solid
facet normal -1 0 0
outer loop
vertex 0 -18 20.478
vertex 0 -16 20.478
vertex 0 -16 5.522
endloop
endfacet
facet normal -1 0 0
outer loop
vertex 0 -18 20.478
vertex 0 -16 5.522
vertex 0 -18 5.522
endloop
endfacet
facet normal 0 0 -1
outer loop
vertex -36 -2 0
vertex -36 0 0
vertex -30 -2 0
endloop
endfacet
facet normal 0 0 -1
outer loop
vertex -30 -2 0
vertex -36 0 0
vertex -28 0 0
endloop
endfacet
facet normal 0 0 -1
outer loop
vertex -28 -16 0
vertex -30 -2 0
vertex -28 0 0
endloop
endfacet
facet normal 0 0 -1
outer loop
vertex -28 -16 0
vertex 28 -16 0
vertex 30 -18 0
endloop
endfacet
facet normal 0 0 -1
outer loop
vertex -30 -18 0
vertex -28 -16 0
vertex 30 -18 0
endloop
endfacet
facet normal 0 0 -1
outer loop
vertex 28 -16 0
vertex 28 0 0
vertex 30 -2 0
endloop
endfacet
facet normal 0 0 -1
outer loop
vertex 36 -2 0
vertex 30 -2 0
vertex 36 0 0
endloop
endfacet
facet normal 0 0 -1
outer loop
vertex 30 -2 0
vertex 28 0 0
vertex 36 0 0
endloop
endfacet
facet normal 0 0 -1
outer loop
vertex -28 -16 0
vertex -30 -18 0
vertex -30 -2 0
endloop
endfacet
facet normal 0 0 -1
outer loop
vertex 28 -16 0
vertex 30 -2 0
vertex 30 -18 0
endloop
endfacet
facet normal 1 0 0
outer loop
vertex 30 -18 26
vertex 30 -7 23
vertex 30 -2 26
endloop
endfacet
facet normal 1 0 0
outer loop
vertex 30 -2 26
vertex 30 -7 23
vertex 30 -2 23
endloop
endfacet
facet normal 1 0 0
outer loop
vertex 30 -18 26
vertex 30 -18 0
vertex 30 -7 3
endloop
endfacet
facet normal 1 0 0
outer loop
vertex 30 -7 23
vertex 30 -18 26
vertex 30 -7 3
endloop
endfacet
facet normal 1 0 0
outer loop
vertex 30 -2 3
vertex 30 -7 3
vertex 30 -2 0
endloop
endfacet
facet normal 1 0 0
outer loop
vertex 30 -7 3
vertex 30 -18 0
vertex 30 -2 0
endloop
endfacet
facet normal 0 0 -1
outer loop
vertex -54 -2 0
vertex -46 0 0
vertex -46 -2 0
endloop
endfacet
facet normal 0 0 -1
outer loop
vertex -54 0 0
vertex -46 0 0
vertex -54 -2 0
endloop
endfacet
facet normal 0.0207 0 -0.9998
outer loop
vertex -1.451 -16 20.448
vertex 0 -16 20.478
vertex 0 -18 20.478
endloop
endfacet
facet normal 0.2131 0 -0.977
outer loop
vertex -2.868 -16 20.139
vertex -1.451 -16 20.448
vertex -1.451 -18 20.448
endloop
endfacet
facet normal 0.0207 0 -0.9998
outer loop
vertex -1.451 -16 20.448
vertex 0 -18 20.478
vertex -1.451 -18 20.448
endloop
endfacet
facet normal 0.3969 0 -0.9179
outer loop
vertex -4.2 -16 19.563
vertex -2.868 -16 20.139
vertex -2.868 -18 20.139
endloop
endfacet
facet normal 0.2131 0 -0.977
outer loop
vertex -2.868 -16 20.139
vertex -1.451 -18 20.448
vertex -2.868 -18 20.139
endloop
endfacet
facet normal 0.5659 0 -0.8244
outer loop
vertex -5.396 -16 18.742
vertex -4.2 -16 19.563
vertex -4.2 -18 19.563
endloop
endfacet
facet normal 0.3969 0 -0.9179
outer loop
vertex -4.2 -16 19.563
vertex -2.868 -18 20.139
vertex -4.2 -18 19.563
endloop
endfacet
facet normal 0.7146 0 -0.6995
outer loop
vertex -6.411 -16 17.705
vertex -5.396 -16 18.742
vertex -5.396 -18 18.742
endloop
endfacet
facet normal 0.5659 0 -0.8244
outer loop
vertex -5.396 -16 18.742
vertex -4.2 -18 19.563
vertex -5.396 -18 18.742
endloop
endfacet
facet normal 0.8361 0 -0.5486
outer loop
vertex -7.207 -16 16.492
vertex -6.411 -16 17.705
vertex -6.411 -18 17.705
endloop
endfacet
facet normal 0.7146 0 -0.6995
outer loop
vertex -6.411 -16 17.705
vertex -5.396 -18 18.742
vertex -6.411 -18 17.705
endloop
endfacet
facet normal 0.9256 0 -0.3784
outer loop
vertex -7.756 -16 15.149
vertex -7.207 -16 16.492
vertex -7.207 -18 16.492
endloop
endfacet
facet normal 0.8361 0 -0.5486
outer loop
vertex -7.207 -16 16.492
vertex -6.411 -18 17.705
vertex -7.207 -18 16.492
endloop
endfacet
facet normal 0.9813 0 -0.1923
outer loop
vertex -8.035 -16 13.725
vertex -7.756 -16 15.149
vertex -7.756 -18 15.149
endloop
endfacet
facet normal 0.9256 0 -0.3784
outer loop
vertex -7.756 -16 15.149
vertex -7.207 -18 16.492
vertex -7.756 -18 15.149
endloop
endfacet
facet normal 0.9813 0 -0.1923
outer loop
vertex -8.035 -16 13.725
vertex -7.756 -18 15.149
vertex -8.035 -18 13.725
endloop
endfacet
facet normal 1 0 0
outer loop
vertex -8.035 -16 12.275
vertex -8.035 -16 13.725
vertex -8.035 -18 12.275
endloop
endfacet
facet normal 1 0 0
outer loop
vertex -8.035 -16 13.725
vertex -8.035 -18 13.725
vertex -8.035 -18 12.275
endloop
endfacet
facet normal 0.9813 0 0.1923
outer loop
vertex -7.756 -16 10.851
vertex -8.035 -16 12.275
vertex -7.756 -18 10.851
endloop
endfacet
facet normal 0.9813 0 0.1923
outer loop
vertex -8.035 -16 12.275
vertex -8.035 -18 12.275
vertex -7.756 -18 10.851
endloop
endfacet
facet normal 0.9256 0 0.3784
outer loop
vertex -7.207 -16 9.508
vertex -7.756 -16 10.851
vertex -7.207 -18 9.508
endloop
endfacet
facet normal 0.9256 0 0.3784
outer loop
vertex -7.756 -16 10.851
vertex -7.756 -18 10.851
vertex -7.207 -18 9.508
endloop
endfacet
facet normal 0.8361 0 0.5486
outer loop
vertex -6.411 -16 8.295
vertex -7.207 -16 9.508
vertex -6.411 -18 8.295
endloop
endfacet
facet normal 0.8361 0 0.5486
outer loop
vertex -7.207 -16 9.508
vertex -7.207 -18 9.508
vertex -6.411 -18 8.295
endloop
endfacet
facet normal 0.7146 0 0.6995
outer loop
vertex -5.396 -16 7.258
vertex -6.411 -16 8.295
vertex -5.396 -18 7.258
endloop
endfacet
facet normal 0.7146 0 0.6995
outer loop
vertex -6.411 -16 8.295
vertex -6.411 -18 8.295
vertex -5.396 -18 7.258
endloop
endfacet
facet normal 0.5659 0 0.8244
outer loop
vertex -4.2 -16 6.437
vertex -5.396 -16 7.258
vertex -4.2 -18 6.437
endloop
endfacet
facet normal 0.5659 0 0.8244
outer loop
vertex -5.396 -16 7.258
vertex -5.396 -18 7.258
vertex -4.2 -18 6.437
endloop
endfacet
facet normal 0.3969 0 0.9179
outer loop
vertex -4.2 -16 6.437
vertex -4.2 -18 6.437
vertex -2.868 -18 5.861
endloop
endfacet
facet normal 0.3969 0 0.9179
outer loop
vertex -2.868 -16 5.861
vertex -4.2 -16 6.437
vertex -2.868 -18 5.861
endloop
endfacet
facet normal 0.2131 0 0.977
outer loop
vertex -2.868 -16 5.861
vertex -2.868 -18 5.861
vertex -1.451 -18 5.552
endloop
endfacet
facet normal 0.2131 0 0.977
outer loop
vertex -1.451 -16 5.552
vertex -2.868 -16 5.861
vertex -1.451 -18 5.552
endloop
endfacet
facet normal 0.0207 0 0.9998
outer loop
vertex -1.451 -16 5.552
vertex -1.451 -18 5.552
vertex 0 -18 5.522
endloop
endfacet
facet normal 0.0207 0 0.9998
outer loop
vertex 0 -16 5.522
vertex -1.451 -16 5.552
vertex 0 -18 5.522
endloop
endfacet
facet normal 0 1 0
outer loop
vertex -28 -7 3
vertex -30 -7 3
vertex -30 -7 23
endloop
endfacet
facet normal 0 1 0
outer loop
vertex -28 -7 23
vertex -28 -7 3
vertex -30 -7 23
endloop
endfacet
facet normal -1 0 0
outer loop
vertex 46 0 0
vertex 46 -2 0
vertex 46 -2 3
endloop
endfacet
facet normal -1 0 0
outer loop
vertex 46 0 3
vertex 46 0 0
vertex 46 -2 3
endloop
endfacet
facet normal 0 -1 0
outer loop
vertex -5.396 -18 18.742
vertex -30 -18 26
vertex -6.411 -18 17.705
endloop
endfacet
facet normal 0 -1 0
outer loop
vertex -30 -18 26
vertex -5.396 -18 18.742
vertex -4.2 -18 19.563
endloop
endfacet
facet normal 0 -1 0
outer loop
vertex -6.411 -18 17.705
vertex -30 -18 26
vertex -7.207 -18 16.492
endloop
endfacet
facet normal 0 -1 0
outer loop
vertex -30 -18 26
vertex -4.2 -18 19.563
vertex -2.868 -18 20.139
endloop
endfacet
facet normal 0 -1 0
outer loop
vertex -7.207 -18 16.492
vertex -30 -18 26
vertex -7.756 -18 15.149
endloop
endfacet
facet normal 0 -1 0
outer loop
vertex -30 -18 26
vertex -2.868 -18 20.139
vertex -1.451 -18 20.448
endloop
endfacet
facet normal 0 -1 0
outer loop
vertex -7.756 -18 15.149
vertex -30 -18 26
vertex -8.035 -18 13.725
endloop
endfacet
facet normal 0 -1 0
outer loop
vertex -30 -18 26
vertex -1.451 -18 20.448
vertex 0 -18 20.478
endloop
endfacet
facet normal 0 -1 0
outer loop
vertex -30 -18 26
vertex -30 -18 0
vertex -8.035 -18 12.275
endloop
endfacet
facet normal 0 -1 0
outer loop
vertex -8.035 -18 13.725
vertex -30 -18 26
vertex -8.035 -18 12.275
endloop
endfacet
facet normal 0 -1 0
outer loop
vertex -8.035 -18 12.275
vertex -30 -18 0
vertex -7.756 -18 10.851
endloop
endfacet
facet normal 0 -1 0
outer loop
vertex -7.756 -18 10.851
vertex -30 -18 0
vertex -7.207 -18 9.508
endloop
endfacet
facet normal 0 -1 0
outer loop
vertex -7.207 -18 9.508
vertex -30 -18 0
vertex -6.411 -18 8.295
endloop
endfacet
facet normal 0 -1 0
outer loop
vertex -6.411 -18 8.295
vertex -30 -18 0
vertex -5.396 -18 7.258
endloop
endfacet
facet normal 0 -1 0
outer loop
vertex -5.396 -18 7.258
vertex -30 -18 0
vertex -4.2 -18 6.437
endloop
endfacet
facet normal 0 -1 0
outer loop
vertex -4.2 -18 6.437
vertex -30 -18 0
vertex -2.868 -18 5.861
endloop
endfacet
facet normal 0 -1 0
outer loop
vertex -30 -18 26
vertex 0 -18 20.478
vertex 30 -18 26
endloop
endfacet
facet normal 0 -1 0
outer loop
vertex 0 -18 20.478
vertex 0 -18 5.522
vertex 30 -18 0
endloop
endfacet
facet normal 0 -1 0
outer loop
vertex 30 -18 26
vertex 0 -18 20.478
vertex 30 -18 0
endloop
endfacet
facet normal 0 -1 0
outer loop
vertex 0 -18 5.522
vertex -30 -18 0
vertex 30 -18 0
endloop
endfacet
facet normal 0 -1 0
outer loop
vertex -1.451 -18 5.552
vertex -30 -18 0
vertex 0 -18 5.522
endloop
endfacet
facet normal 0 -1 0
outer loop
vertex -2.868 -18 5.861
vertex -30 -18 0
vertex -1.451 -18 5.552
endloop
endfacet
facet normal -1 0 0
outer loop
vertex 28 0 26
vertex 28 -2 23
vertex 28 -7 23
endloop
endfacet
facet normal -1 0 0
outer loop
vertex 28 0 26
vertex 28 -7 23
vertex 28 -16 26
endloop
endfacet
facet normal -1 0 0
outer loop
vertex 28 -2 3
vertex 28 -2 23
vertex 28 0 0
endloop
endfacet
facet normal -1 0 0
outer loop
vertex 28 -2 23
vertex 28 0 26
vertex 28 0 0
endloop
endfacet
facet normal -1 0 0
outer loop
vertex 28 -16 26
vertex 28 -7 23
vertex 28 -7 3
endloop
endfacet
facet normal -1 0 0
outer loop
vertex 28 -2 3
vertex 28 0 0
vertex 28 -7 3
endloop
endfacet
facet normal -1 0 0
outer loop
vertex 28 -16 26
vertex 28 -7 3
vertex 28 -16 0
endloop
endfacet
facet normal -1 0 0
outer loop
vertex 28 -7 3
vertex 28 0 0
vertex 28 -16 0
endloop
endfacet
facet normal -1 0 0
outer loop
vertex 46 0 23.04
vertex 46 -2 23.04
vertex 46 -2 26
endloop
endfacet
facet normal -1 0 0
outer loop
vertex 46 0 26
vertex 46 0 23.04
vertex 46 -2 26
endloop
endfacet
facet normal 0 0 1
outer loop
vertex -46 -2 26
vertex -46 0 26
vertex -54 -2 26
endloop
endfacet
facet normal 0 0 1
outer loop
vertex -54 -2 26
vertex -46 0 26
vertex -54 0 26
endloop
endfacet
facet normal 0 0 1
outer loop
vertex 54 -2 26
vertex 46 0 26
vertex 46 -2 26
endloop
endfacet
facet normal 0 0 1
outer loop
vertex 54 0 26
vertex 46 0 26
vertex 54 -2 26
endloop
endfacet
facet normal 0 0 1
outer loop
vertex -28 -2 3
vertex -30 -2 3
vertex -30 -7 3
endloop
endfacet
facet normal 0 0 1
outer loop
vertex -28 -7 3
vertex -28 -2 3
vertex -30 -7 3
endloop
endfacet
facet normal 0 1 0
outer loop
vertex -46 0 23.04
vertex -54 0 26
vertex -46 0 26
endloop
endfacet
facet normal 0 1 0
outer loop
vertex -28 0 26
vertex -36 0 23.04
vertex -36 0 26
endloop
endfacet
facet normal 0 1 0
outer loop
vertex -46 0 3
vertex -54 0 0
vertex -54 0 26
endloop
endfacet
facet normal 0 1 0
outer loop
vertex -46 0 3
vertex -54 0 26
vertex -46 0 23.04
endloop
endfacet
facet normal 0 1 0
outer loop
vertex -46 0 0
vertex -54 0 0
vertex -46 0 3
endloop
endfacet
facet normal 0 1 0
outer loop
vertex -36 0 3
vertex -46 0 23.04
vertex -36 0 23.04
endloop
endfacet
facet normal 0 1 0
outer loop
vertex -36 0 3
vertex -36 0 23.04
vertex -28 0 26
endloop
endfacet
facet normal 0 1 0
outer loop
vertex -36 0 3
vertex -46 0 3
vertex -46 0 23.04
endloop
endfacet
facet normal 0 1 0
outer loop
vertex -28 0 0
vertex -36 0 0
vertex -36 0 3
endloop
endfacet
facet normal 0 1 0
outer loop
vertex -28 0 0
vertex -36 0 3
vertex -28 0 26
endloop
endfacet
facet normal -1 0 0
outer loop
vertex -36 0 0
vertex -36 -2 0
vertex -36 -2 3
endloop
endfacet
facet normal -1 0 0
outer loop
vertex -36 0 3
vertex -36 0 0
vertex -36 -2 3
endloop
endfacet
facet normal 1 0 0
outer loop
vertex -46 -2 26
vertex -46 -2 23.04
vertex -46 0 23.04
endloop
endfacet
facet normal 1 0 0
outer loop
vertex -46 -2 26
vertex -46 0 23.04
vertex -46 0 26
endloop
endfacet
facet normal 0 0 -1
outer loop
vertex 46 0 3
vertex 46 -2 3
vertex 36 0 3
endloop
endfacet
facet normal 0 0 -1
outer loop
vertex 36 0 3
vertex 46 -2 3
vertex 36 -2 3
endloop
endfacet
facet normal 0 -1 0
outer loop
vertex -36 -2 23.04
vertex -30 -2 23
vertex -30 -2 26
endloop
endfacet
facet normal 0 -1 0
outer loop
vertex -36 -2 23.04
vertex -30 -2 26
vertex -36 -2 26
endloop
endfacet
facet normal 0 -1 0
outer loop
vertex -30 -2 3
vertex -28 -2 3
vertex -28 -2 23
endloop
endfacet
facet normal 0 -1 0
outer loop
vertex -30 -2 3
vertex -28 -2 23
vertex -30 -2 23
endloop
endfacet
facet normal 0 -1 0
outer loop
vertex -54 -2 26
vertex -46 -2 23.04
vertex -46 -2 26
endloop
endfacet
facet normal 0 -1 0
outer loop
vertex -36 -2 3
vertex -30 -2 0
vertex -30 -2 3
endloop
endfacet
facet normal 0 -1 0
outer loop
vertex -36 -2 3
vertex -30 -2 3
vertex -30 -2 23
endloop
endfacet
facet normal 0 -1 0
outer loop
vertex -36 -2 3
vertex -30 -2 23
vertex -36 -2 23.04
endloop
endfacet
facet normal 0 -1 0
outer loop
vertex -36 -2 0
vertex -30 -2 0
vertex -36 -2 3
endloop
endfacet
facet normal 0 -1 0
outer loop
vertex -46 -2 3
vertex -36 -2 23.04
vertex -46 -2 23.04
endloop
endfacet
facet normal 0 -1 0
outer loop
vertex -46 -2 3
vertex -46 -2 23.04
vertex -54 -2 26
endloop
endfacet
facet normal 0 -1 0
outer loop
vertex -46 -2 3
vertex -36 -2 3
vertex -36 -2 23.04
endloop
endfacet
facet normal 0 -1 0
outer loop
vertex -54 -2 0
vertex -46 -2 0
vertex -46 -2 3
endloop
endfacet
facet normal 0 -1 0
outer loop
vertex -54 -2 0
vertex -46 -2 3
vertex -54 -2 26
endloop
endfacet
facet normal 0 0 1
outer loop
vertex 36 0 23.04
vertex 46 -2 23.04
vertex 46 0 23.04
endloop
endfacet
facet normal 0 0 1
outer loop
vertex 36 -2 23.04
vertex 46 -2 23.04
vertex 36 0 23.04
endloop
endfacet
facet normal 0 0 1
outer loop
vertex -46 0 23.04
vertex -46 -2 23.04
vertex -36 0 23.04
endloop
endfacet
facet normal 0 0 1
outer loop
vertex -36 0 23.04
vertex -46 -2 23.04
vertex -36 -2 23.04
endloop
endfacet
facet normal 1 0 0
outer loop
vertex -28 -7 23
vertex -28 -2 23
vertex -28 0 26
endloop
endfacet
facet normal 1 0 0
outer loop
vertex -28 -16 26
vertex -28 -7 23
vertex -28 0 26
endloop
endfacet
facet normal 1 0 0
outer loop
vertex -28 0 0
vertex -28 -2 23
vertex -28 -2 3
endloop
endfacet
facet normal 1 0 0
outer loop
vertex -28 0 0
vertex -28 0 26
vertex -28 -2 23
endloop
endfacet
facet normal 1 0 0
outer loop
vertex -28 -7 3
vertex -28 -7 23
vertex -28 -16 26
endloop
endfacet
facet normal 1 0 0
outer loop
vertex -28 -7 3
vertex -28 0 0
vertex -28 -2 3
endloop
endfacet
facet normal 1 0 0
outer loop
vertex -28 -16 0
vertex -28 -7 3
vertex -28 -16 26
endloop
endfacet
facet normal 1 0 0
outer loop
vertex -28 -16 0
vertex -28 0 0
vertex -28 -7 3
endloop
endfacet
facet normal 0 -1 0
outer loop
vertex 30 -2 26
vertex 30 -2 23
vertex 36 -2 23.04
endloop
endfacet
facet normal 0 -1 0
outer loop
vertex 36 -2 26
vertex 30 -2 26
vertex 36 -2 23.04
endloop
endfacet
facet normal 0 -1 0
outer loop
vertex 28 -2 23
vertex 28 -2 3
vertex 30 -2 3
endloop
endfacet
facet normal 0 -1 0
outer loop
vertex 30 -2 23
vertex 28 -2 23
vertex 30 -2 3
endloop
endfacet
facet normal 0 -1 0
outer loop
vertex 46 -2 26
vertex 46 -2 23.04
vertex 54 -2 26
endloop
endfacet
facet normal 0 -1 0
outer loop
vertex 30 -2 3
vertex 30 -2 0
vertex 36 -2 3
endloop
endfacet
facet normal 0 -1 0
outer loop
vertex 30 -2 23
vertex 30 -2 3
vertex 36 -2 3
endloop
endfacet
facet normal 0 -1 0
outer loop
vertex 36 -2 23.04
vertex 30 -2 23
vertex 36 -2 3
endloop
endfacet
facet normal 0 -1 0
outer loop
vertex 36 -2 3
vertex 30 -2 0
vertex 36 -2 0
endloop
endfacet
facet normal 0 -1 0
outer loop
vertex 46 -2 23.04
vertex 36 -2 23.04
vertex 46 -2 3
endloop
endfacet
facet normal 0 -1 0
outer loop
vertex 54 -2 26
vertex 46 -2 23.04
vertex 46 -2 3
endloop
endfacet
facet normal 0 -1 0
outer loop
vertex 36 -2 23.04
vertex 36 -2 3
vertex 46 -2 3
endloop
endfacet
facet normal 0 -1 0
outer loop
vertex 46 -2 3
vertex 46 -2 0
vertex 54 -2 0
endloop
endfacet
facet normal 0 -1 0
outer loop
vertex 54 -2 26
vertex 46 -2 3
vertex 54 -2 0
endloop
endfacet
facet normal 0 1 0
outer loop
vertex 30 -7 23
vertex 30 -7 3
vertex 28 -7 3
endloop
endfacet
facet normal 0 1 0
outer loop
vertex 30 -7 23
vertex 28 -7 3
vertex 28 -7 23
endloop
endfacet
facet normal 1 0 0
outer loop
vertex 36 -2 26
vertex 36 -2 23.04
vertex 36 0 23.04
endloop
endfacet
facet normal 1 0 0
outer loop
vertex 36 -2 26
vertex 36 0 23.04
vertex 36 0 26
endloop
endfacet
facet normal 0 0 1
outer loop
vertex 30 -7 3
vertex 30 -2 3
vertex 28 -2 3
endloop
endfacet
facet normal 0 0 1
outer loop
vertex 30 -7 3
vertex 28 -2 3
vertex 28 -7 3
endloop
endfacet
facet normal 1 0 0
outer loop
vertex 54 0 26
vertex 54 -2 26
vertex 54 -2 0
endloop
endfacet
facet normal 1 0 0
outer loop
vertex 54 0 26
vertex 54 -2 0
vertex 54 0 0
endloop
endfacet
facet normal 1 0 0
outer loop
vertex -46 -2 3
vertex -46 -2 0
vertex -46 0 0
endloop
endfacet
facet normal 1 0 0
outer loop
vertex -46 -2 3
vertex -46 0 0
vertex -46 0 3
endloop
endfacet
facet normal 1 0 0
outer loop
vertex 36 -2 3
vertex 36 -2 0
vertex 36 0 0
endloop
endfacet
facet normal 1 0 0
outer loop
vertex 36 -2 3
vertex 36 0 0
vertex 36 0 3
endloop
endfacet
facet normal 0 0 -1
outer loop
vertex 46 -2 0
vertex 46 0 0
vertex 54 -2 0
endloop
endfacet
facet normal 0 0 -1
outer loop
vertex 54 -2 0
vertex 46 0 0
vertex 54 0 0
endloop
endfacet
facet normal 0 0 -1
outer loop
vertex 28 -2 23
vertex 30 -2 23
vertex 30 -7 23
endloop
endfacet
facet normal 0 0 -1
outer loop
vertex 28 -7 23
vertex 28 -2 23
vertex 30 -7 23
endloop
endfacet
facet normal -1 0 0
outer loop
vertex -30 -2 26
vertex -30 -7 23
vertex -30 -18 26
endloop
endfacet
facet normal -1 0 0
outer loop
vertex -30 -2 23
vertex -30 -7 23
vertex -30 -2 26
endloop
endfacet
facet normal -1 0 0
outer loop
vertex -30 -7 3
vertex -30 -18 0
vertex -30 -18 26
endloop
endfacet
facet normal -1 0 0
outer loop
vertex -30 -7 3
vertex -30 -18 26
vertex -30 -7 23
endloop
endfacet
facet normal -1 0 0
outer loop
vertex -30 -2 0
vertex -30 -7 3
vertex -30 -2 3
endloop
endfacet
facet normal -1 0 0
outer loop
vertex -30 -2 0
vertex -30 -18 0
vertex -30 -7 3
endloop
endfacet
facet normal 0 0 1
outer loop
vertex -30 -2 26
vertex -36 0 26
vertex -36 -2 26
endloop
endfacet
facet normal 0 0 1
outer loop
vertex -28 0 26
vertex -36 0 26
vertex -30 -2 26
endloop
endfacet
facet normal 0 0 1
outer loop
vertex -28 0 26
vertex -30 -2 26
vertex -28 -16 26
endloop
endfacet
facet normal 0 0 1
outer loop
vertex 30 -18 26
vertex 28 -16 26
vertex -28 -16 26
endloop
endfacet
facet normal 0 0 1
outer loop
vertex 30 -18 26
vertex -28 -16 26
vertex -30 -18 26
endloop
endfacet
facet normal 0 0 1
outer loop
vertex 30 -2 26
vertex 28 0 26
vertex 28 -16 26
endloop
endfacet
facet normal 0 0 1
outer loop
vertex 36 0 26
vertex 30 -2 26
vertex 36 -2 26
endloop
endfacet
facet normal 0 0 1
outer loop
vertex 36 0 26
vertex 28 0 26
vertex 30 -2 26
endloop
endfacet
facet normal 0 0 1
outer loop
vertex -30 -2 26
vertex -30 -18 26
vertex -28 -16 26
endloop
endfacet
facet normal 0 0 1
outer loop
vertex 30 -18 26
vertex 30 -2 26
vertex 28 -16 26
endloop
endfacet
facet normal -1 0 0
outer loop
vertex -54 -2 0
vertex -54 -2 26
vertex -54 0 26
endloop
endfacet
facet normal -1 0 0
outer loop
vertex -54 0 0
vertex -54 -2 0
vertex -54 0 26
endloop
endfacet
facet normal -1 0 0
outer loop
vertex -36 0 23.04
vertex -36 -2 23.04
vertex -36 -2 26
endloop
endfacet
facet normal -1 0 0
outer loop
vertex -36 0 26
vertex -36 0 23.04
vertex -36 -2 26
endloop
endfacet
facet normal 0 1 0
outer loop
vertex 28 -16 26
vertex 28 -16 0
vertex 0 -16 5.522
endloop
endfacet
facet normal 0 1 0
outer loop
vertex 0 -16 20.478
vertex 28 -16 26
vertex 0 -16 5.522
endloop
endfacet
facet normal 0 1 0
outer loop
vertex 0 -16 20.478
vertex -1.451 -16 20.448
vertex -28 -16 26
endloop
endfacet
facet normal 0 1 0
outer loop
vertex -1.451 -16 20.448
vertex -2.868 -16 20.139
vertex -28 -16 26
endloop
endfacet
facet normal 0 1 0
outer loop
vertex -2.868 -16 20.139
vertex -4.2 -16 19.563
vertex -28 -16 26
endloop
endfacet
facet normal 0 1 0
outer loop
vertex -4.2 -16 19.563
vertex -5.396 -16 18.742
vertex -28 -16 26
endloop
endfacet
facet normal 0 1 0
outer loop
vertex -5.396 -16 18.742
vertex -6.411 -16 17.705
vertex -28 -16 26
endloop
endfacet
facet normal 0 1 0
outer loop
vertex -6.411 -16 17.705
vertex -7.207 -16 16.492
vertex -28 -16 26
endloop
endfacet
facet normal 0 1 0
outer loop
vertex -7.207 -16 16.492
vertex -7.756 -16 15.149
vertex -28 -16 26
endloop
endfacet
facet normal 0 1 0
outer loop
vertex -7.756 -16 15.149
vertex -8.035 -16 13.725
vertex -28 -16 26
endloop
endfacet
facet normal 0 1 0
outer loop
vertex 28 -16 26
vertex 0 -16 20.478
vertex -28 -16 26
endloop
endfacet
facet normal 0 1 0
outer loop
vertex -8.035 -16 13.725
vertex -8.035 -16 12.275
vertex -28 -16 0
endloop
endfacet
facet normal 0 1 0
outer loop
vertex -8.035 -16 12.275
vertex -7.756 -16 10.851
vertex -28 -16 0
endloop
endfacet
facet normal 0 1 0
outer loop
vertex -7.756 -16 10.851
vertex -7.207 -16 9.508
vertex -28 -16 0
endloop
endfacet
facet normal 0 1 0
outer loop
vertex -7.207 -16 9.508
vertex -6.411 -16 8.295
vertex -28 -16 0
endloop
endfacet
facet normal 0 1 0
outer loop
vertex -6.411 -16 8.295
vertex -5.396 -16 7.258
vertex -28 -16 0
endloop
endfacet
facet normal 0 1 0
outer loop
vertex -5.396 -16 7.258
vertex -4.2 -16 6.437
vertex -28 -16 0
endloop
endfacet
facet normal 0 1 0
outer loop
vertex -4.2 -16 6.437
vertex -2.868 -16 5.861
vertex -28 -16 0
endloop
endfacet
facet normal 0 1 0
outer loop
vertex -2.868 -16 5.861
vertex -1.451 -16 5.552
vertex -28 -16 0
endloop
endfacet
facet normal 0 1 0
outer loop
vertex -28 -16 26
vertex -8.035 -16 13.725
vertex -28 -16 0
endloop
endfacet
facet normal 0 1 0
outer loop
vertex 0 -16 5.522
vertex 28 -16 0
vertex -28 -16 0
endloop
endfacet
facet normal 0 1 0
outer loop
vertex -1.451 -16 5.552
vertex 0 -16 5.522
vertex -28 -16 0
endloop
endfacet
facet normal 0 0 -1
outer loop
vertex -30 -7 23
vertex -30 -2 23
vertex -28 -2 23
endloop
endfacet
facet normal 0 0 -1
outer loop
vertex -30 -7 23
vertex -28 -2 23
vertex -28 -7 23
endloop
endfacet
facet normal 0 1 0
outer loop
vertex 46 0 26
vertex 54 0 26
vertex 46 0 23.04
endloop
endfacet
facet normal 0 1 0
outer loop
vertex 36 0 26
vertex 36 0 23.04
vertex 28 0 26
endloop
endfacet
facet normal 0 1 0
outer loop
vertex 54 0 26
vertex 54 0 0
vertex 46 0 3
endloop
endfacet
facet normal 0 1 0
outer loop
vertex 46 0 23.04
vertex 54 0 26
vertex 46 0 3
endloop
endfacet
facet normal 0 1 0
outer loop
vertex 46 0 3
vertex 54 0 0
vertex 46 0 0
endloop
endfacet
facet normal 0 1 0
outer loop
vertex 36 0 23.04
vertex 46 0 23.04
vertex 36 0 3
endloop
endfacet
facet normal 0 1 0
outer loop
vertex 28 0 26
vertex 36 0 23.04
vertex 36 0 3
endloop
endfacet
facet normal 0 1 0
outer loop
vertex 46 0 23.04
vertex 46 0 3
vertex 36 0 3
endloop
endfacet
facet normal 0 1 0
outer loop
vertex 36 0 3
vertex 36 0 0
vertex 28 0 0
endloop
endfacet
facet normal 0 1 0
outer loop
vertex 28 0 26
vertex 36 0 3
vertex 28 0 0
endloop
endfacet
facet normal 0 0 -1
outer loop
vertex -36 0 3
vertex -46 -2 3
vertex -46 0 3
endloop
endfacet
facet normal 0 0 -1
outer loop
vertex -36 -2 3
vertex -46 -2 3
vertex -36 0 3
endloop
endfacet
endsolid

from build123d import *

# Parameters (mm, degrees)
PAD_DEPTH       = 26
SKETCH002_W     = 5
SKETCH002_H     = 20
POCKET_DEPTH    = 155.156903
SKETCH004_W     = 10
SKETCH004_H     = 3
POCKET001_DEPTH = 5
SKETCH005_R     = 7.5
POCKET002_DEPTH = 5


with BuildPart() as part:
    # Sketch → Pad (new body)
    with BuildSketch(Plane.XY):
        Polygon((-54, 0), (-28, 0), (-28, -16), (0, -16), (0, -18), (-30, -18), (-30, -2), (-54, -2), align=None)
    pad = extrude(amount=PAD_DEPTH)

    # Sketch002 (on DatumPlane) → Pocket (cut, through all)
    with BuildSketch(Plane(origin=(-30, 0, 0), x_dir=(0, -1, 0), z_dir=(-1, 0, 0))):
        with Locations((4.5, 13)):
            Rectangle(SKETCH002_W, SKETCH002_H)
    pocket = extrude(amount=-POCKET_DEPTH, mode=Mode.SUBTRACT)

    # Sketch004 (on DatumPlane) → Pocket001 (cut)
    with BuildSketch(Plane.XZ.offset(2)):
        with Locations((-41, 24.53954)):
            Rectangle(SKETCH004_W, SKETCH004_H)
        with Locations((-41, 1.5)):
            Rectangle(SKETCH004_W, SKETCH004_H)
    pocket001 = extrude(amount=-POCKET001_DEPTH, mode=Mode.SUBTRACT)

    # Sketch005 (on DatumPlane) → Pocket002 (cut)
    with BuildSketch(Plane.XZ.offset(18)):
        with Locations((-0.570245, 13)):
            Circle(SKETCH005_R)
    extrude(amount=-POCKET002_DEPTH, mode=Mode.SUBTRACT)

    # Mirrored: Pad across Sketch V_Axis
    add(pad.mirror(Plane(origin=(0, 0, 0), x_dir=(0, 0, 1), z_dir=(1, 0, 0))))

    # Mirrored001: Pocket across YZ
    add(pocket.mirror(Plane.YZ), mode=Mode.SUBTRACT)

    # Mirrored002: Pocket001 across Sketch004 V_Axis
    add(pocket001.mirror(Plane(origin=(0, -2, 0), x_dir=(0, -1, 0), z_dir=(1, 0, 0))), mode=Mode.SUBTRACT)


solid = part.part
